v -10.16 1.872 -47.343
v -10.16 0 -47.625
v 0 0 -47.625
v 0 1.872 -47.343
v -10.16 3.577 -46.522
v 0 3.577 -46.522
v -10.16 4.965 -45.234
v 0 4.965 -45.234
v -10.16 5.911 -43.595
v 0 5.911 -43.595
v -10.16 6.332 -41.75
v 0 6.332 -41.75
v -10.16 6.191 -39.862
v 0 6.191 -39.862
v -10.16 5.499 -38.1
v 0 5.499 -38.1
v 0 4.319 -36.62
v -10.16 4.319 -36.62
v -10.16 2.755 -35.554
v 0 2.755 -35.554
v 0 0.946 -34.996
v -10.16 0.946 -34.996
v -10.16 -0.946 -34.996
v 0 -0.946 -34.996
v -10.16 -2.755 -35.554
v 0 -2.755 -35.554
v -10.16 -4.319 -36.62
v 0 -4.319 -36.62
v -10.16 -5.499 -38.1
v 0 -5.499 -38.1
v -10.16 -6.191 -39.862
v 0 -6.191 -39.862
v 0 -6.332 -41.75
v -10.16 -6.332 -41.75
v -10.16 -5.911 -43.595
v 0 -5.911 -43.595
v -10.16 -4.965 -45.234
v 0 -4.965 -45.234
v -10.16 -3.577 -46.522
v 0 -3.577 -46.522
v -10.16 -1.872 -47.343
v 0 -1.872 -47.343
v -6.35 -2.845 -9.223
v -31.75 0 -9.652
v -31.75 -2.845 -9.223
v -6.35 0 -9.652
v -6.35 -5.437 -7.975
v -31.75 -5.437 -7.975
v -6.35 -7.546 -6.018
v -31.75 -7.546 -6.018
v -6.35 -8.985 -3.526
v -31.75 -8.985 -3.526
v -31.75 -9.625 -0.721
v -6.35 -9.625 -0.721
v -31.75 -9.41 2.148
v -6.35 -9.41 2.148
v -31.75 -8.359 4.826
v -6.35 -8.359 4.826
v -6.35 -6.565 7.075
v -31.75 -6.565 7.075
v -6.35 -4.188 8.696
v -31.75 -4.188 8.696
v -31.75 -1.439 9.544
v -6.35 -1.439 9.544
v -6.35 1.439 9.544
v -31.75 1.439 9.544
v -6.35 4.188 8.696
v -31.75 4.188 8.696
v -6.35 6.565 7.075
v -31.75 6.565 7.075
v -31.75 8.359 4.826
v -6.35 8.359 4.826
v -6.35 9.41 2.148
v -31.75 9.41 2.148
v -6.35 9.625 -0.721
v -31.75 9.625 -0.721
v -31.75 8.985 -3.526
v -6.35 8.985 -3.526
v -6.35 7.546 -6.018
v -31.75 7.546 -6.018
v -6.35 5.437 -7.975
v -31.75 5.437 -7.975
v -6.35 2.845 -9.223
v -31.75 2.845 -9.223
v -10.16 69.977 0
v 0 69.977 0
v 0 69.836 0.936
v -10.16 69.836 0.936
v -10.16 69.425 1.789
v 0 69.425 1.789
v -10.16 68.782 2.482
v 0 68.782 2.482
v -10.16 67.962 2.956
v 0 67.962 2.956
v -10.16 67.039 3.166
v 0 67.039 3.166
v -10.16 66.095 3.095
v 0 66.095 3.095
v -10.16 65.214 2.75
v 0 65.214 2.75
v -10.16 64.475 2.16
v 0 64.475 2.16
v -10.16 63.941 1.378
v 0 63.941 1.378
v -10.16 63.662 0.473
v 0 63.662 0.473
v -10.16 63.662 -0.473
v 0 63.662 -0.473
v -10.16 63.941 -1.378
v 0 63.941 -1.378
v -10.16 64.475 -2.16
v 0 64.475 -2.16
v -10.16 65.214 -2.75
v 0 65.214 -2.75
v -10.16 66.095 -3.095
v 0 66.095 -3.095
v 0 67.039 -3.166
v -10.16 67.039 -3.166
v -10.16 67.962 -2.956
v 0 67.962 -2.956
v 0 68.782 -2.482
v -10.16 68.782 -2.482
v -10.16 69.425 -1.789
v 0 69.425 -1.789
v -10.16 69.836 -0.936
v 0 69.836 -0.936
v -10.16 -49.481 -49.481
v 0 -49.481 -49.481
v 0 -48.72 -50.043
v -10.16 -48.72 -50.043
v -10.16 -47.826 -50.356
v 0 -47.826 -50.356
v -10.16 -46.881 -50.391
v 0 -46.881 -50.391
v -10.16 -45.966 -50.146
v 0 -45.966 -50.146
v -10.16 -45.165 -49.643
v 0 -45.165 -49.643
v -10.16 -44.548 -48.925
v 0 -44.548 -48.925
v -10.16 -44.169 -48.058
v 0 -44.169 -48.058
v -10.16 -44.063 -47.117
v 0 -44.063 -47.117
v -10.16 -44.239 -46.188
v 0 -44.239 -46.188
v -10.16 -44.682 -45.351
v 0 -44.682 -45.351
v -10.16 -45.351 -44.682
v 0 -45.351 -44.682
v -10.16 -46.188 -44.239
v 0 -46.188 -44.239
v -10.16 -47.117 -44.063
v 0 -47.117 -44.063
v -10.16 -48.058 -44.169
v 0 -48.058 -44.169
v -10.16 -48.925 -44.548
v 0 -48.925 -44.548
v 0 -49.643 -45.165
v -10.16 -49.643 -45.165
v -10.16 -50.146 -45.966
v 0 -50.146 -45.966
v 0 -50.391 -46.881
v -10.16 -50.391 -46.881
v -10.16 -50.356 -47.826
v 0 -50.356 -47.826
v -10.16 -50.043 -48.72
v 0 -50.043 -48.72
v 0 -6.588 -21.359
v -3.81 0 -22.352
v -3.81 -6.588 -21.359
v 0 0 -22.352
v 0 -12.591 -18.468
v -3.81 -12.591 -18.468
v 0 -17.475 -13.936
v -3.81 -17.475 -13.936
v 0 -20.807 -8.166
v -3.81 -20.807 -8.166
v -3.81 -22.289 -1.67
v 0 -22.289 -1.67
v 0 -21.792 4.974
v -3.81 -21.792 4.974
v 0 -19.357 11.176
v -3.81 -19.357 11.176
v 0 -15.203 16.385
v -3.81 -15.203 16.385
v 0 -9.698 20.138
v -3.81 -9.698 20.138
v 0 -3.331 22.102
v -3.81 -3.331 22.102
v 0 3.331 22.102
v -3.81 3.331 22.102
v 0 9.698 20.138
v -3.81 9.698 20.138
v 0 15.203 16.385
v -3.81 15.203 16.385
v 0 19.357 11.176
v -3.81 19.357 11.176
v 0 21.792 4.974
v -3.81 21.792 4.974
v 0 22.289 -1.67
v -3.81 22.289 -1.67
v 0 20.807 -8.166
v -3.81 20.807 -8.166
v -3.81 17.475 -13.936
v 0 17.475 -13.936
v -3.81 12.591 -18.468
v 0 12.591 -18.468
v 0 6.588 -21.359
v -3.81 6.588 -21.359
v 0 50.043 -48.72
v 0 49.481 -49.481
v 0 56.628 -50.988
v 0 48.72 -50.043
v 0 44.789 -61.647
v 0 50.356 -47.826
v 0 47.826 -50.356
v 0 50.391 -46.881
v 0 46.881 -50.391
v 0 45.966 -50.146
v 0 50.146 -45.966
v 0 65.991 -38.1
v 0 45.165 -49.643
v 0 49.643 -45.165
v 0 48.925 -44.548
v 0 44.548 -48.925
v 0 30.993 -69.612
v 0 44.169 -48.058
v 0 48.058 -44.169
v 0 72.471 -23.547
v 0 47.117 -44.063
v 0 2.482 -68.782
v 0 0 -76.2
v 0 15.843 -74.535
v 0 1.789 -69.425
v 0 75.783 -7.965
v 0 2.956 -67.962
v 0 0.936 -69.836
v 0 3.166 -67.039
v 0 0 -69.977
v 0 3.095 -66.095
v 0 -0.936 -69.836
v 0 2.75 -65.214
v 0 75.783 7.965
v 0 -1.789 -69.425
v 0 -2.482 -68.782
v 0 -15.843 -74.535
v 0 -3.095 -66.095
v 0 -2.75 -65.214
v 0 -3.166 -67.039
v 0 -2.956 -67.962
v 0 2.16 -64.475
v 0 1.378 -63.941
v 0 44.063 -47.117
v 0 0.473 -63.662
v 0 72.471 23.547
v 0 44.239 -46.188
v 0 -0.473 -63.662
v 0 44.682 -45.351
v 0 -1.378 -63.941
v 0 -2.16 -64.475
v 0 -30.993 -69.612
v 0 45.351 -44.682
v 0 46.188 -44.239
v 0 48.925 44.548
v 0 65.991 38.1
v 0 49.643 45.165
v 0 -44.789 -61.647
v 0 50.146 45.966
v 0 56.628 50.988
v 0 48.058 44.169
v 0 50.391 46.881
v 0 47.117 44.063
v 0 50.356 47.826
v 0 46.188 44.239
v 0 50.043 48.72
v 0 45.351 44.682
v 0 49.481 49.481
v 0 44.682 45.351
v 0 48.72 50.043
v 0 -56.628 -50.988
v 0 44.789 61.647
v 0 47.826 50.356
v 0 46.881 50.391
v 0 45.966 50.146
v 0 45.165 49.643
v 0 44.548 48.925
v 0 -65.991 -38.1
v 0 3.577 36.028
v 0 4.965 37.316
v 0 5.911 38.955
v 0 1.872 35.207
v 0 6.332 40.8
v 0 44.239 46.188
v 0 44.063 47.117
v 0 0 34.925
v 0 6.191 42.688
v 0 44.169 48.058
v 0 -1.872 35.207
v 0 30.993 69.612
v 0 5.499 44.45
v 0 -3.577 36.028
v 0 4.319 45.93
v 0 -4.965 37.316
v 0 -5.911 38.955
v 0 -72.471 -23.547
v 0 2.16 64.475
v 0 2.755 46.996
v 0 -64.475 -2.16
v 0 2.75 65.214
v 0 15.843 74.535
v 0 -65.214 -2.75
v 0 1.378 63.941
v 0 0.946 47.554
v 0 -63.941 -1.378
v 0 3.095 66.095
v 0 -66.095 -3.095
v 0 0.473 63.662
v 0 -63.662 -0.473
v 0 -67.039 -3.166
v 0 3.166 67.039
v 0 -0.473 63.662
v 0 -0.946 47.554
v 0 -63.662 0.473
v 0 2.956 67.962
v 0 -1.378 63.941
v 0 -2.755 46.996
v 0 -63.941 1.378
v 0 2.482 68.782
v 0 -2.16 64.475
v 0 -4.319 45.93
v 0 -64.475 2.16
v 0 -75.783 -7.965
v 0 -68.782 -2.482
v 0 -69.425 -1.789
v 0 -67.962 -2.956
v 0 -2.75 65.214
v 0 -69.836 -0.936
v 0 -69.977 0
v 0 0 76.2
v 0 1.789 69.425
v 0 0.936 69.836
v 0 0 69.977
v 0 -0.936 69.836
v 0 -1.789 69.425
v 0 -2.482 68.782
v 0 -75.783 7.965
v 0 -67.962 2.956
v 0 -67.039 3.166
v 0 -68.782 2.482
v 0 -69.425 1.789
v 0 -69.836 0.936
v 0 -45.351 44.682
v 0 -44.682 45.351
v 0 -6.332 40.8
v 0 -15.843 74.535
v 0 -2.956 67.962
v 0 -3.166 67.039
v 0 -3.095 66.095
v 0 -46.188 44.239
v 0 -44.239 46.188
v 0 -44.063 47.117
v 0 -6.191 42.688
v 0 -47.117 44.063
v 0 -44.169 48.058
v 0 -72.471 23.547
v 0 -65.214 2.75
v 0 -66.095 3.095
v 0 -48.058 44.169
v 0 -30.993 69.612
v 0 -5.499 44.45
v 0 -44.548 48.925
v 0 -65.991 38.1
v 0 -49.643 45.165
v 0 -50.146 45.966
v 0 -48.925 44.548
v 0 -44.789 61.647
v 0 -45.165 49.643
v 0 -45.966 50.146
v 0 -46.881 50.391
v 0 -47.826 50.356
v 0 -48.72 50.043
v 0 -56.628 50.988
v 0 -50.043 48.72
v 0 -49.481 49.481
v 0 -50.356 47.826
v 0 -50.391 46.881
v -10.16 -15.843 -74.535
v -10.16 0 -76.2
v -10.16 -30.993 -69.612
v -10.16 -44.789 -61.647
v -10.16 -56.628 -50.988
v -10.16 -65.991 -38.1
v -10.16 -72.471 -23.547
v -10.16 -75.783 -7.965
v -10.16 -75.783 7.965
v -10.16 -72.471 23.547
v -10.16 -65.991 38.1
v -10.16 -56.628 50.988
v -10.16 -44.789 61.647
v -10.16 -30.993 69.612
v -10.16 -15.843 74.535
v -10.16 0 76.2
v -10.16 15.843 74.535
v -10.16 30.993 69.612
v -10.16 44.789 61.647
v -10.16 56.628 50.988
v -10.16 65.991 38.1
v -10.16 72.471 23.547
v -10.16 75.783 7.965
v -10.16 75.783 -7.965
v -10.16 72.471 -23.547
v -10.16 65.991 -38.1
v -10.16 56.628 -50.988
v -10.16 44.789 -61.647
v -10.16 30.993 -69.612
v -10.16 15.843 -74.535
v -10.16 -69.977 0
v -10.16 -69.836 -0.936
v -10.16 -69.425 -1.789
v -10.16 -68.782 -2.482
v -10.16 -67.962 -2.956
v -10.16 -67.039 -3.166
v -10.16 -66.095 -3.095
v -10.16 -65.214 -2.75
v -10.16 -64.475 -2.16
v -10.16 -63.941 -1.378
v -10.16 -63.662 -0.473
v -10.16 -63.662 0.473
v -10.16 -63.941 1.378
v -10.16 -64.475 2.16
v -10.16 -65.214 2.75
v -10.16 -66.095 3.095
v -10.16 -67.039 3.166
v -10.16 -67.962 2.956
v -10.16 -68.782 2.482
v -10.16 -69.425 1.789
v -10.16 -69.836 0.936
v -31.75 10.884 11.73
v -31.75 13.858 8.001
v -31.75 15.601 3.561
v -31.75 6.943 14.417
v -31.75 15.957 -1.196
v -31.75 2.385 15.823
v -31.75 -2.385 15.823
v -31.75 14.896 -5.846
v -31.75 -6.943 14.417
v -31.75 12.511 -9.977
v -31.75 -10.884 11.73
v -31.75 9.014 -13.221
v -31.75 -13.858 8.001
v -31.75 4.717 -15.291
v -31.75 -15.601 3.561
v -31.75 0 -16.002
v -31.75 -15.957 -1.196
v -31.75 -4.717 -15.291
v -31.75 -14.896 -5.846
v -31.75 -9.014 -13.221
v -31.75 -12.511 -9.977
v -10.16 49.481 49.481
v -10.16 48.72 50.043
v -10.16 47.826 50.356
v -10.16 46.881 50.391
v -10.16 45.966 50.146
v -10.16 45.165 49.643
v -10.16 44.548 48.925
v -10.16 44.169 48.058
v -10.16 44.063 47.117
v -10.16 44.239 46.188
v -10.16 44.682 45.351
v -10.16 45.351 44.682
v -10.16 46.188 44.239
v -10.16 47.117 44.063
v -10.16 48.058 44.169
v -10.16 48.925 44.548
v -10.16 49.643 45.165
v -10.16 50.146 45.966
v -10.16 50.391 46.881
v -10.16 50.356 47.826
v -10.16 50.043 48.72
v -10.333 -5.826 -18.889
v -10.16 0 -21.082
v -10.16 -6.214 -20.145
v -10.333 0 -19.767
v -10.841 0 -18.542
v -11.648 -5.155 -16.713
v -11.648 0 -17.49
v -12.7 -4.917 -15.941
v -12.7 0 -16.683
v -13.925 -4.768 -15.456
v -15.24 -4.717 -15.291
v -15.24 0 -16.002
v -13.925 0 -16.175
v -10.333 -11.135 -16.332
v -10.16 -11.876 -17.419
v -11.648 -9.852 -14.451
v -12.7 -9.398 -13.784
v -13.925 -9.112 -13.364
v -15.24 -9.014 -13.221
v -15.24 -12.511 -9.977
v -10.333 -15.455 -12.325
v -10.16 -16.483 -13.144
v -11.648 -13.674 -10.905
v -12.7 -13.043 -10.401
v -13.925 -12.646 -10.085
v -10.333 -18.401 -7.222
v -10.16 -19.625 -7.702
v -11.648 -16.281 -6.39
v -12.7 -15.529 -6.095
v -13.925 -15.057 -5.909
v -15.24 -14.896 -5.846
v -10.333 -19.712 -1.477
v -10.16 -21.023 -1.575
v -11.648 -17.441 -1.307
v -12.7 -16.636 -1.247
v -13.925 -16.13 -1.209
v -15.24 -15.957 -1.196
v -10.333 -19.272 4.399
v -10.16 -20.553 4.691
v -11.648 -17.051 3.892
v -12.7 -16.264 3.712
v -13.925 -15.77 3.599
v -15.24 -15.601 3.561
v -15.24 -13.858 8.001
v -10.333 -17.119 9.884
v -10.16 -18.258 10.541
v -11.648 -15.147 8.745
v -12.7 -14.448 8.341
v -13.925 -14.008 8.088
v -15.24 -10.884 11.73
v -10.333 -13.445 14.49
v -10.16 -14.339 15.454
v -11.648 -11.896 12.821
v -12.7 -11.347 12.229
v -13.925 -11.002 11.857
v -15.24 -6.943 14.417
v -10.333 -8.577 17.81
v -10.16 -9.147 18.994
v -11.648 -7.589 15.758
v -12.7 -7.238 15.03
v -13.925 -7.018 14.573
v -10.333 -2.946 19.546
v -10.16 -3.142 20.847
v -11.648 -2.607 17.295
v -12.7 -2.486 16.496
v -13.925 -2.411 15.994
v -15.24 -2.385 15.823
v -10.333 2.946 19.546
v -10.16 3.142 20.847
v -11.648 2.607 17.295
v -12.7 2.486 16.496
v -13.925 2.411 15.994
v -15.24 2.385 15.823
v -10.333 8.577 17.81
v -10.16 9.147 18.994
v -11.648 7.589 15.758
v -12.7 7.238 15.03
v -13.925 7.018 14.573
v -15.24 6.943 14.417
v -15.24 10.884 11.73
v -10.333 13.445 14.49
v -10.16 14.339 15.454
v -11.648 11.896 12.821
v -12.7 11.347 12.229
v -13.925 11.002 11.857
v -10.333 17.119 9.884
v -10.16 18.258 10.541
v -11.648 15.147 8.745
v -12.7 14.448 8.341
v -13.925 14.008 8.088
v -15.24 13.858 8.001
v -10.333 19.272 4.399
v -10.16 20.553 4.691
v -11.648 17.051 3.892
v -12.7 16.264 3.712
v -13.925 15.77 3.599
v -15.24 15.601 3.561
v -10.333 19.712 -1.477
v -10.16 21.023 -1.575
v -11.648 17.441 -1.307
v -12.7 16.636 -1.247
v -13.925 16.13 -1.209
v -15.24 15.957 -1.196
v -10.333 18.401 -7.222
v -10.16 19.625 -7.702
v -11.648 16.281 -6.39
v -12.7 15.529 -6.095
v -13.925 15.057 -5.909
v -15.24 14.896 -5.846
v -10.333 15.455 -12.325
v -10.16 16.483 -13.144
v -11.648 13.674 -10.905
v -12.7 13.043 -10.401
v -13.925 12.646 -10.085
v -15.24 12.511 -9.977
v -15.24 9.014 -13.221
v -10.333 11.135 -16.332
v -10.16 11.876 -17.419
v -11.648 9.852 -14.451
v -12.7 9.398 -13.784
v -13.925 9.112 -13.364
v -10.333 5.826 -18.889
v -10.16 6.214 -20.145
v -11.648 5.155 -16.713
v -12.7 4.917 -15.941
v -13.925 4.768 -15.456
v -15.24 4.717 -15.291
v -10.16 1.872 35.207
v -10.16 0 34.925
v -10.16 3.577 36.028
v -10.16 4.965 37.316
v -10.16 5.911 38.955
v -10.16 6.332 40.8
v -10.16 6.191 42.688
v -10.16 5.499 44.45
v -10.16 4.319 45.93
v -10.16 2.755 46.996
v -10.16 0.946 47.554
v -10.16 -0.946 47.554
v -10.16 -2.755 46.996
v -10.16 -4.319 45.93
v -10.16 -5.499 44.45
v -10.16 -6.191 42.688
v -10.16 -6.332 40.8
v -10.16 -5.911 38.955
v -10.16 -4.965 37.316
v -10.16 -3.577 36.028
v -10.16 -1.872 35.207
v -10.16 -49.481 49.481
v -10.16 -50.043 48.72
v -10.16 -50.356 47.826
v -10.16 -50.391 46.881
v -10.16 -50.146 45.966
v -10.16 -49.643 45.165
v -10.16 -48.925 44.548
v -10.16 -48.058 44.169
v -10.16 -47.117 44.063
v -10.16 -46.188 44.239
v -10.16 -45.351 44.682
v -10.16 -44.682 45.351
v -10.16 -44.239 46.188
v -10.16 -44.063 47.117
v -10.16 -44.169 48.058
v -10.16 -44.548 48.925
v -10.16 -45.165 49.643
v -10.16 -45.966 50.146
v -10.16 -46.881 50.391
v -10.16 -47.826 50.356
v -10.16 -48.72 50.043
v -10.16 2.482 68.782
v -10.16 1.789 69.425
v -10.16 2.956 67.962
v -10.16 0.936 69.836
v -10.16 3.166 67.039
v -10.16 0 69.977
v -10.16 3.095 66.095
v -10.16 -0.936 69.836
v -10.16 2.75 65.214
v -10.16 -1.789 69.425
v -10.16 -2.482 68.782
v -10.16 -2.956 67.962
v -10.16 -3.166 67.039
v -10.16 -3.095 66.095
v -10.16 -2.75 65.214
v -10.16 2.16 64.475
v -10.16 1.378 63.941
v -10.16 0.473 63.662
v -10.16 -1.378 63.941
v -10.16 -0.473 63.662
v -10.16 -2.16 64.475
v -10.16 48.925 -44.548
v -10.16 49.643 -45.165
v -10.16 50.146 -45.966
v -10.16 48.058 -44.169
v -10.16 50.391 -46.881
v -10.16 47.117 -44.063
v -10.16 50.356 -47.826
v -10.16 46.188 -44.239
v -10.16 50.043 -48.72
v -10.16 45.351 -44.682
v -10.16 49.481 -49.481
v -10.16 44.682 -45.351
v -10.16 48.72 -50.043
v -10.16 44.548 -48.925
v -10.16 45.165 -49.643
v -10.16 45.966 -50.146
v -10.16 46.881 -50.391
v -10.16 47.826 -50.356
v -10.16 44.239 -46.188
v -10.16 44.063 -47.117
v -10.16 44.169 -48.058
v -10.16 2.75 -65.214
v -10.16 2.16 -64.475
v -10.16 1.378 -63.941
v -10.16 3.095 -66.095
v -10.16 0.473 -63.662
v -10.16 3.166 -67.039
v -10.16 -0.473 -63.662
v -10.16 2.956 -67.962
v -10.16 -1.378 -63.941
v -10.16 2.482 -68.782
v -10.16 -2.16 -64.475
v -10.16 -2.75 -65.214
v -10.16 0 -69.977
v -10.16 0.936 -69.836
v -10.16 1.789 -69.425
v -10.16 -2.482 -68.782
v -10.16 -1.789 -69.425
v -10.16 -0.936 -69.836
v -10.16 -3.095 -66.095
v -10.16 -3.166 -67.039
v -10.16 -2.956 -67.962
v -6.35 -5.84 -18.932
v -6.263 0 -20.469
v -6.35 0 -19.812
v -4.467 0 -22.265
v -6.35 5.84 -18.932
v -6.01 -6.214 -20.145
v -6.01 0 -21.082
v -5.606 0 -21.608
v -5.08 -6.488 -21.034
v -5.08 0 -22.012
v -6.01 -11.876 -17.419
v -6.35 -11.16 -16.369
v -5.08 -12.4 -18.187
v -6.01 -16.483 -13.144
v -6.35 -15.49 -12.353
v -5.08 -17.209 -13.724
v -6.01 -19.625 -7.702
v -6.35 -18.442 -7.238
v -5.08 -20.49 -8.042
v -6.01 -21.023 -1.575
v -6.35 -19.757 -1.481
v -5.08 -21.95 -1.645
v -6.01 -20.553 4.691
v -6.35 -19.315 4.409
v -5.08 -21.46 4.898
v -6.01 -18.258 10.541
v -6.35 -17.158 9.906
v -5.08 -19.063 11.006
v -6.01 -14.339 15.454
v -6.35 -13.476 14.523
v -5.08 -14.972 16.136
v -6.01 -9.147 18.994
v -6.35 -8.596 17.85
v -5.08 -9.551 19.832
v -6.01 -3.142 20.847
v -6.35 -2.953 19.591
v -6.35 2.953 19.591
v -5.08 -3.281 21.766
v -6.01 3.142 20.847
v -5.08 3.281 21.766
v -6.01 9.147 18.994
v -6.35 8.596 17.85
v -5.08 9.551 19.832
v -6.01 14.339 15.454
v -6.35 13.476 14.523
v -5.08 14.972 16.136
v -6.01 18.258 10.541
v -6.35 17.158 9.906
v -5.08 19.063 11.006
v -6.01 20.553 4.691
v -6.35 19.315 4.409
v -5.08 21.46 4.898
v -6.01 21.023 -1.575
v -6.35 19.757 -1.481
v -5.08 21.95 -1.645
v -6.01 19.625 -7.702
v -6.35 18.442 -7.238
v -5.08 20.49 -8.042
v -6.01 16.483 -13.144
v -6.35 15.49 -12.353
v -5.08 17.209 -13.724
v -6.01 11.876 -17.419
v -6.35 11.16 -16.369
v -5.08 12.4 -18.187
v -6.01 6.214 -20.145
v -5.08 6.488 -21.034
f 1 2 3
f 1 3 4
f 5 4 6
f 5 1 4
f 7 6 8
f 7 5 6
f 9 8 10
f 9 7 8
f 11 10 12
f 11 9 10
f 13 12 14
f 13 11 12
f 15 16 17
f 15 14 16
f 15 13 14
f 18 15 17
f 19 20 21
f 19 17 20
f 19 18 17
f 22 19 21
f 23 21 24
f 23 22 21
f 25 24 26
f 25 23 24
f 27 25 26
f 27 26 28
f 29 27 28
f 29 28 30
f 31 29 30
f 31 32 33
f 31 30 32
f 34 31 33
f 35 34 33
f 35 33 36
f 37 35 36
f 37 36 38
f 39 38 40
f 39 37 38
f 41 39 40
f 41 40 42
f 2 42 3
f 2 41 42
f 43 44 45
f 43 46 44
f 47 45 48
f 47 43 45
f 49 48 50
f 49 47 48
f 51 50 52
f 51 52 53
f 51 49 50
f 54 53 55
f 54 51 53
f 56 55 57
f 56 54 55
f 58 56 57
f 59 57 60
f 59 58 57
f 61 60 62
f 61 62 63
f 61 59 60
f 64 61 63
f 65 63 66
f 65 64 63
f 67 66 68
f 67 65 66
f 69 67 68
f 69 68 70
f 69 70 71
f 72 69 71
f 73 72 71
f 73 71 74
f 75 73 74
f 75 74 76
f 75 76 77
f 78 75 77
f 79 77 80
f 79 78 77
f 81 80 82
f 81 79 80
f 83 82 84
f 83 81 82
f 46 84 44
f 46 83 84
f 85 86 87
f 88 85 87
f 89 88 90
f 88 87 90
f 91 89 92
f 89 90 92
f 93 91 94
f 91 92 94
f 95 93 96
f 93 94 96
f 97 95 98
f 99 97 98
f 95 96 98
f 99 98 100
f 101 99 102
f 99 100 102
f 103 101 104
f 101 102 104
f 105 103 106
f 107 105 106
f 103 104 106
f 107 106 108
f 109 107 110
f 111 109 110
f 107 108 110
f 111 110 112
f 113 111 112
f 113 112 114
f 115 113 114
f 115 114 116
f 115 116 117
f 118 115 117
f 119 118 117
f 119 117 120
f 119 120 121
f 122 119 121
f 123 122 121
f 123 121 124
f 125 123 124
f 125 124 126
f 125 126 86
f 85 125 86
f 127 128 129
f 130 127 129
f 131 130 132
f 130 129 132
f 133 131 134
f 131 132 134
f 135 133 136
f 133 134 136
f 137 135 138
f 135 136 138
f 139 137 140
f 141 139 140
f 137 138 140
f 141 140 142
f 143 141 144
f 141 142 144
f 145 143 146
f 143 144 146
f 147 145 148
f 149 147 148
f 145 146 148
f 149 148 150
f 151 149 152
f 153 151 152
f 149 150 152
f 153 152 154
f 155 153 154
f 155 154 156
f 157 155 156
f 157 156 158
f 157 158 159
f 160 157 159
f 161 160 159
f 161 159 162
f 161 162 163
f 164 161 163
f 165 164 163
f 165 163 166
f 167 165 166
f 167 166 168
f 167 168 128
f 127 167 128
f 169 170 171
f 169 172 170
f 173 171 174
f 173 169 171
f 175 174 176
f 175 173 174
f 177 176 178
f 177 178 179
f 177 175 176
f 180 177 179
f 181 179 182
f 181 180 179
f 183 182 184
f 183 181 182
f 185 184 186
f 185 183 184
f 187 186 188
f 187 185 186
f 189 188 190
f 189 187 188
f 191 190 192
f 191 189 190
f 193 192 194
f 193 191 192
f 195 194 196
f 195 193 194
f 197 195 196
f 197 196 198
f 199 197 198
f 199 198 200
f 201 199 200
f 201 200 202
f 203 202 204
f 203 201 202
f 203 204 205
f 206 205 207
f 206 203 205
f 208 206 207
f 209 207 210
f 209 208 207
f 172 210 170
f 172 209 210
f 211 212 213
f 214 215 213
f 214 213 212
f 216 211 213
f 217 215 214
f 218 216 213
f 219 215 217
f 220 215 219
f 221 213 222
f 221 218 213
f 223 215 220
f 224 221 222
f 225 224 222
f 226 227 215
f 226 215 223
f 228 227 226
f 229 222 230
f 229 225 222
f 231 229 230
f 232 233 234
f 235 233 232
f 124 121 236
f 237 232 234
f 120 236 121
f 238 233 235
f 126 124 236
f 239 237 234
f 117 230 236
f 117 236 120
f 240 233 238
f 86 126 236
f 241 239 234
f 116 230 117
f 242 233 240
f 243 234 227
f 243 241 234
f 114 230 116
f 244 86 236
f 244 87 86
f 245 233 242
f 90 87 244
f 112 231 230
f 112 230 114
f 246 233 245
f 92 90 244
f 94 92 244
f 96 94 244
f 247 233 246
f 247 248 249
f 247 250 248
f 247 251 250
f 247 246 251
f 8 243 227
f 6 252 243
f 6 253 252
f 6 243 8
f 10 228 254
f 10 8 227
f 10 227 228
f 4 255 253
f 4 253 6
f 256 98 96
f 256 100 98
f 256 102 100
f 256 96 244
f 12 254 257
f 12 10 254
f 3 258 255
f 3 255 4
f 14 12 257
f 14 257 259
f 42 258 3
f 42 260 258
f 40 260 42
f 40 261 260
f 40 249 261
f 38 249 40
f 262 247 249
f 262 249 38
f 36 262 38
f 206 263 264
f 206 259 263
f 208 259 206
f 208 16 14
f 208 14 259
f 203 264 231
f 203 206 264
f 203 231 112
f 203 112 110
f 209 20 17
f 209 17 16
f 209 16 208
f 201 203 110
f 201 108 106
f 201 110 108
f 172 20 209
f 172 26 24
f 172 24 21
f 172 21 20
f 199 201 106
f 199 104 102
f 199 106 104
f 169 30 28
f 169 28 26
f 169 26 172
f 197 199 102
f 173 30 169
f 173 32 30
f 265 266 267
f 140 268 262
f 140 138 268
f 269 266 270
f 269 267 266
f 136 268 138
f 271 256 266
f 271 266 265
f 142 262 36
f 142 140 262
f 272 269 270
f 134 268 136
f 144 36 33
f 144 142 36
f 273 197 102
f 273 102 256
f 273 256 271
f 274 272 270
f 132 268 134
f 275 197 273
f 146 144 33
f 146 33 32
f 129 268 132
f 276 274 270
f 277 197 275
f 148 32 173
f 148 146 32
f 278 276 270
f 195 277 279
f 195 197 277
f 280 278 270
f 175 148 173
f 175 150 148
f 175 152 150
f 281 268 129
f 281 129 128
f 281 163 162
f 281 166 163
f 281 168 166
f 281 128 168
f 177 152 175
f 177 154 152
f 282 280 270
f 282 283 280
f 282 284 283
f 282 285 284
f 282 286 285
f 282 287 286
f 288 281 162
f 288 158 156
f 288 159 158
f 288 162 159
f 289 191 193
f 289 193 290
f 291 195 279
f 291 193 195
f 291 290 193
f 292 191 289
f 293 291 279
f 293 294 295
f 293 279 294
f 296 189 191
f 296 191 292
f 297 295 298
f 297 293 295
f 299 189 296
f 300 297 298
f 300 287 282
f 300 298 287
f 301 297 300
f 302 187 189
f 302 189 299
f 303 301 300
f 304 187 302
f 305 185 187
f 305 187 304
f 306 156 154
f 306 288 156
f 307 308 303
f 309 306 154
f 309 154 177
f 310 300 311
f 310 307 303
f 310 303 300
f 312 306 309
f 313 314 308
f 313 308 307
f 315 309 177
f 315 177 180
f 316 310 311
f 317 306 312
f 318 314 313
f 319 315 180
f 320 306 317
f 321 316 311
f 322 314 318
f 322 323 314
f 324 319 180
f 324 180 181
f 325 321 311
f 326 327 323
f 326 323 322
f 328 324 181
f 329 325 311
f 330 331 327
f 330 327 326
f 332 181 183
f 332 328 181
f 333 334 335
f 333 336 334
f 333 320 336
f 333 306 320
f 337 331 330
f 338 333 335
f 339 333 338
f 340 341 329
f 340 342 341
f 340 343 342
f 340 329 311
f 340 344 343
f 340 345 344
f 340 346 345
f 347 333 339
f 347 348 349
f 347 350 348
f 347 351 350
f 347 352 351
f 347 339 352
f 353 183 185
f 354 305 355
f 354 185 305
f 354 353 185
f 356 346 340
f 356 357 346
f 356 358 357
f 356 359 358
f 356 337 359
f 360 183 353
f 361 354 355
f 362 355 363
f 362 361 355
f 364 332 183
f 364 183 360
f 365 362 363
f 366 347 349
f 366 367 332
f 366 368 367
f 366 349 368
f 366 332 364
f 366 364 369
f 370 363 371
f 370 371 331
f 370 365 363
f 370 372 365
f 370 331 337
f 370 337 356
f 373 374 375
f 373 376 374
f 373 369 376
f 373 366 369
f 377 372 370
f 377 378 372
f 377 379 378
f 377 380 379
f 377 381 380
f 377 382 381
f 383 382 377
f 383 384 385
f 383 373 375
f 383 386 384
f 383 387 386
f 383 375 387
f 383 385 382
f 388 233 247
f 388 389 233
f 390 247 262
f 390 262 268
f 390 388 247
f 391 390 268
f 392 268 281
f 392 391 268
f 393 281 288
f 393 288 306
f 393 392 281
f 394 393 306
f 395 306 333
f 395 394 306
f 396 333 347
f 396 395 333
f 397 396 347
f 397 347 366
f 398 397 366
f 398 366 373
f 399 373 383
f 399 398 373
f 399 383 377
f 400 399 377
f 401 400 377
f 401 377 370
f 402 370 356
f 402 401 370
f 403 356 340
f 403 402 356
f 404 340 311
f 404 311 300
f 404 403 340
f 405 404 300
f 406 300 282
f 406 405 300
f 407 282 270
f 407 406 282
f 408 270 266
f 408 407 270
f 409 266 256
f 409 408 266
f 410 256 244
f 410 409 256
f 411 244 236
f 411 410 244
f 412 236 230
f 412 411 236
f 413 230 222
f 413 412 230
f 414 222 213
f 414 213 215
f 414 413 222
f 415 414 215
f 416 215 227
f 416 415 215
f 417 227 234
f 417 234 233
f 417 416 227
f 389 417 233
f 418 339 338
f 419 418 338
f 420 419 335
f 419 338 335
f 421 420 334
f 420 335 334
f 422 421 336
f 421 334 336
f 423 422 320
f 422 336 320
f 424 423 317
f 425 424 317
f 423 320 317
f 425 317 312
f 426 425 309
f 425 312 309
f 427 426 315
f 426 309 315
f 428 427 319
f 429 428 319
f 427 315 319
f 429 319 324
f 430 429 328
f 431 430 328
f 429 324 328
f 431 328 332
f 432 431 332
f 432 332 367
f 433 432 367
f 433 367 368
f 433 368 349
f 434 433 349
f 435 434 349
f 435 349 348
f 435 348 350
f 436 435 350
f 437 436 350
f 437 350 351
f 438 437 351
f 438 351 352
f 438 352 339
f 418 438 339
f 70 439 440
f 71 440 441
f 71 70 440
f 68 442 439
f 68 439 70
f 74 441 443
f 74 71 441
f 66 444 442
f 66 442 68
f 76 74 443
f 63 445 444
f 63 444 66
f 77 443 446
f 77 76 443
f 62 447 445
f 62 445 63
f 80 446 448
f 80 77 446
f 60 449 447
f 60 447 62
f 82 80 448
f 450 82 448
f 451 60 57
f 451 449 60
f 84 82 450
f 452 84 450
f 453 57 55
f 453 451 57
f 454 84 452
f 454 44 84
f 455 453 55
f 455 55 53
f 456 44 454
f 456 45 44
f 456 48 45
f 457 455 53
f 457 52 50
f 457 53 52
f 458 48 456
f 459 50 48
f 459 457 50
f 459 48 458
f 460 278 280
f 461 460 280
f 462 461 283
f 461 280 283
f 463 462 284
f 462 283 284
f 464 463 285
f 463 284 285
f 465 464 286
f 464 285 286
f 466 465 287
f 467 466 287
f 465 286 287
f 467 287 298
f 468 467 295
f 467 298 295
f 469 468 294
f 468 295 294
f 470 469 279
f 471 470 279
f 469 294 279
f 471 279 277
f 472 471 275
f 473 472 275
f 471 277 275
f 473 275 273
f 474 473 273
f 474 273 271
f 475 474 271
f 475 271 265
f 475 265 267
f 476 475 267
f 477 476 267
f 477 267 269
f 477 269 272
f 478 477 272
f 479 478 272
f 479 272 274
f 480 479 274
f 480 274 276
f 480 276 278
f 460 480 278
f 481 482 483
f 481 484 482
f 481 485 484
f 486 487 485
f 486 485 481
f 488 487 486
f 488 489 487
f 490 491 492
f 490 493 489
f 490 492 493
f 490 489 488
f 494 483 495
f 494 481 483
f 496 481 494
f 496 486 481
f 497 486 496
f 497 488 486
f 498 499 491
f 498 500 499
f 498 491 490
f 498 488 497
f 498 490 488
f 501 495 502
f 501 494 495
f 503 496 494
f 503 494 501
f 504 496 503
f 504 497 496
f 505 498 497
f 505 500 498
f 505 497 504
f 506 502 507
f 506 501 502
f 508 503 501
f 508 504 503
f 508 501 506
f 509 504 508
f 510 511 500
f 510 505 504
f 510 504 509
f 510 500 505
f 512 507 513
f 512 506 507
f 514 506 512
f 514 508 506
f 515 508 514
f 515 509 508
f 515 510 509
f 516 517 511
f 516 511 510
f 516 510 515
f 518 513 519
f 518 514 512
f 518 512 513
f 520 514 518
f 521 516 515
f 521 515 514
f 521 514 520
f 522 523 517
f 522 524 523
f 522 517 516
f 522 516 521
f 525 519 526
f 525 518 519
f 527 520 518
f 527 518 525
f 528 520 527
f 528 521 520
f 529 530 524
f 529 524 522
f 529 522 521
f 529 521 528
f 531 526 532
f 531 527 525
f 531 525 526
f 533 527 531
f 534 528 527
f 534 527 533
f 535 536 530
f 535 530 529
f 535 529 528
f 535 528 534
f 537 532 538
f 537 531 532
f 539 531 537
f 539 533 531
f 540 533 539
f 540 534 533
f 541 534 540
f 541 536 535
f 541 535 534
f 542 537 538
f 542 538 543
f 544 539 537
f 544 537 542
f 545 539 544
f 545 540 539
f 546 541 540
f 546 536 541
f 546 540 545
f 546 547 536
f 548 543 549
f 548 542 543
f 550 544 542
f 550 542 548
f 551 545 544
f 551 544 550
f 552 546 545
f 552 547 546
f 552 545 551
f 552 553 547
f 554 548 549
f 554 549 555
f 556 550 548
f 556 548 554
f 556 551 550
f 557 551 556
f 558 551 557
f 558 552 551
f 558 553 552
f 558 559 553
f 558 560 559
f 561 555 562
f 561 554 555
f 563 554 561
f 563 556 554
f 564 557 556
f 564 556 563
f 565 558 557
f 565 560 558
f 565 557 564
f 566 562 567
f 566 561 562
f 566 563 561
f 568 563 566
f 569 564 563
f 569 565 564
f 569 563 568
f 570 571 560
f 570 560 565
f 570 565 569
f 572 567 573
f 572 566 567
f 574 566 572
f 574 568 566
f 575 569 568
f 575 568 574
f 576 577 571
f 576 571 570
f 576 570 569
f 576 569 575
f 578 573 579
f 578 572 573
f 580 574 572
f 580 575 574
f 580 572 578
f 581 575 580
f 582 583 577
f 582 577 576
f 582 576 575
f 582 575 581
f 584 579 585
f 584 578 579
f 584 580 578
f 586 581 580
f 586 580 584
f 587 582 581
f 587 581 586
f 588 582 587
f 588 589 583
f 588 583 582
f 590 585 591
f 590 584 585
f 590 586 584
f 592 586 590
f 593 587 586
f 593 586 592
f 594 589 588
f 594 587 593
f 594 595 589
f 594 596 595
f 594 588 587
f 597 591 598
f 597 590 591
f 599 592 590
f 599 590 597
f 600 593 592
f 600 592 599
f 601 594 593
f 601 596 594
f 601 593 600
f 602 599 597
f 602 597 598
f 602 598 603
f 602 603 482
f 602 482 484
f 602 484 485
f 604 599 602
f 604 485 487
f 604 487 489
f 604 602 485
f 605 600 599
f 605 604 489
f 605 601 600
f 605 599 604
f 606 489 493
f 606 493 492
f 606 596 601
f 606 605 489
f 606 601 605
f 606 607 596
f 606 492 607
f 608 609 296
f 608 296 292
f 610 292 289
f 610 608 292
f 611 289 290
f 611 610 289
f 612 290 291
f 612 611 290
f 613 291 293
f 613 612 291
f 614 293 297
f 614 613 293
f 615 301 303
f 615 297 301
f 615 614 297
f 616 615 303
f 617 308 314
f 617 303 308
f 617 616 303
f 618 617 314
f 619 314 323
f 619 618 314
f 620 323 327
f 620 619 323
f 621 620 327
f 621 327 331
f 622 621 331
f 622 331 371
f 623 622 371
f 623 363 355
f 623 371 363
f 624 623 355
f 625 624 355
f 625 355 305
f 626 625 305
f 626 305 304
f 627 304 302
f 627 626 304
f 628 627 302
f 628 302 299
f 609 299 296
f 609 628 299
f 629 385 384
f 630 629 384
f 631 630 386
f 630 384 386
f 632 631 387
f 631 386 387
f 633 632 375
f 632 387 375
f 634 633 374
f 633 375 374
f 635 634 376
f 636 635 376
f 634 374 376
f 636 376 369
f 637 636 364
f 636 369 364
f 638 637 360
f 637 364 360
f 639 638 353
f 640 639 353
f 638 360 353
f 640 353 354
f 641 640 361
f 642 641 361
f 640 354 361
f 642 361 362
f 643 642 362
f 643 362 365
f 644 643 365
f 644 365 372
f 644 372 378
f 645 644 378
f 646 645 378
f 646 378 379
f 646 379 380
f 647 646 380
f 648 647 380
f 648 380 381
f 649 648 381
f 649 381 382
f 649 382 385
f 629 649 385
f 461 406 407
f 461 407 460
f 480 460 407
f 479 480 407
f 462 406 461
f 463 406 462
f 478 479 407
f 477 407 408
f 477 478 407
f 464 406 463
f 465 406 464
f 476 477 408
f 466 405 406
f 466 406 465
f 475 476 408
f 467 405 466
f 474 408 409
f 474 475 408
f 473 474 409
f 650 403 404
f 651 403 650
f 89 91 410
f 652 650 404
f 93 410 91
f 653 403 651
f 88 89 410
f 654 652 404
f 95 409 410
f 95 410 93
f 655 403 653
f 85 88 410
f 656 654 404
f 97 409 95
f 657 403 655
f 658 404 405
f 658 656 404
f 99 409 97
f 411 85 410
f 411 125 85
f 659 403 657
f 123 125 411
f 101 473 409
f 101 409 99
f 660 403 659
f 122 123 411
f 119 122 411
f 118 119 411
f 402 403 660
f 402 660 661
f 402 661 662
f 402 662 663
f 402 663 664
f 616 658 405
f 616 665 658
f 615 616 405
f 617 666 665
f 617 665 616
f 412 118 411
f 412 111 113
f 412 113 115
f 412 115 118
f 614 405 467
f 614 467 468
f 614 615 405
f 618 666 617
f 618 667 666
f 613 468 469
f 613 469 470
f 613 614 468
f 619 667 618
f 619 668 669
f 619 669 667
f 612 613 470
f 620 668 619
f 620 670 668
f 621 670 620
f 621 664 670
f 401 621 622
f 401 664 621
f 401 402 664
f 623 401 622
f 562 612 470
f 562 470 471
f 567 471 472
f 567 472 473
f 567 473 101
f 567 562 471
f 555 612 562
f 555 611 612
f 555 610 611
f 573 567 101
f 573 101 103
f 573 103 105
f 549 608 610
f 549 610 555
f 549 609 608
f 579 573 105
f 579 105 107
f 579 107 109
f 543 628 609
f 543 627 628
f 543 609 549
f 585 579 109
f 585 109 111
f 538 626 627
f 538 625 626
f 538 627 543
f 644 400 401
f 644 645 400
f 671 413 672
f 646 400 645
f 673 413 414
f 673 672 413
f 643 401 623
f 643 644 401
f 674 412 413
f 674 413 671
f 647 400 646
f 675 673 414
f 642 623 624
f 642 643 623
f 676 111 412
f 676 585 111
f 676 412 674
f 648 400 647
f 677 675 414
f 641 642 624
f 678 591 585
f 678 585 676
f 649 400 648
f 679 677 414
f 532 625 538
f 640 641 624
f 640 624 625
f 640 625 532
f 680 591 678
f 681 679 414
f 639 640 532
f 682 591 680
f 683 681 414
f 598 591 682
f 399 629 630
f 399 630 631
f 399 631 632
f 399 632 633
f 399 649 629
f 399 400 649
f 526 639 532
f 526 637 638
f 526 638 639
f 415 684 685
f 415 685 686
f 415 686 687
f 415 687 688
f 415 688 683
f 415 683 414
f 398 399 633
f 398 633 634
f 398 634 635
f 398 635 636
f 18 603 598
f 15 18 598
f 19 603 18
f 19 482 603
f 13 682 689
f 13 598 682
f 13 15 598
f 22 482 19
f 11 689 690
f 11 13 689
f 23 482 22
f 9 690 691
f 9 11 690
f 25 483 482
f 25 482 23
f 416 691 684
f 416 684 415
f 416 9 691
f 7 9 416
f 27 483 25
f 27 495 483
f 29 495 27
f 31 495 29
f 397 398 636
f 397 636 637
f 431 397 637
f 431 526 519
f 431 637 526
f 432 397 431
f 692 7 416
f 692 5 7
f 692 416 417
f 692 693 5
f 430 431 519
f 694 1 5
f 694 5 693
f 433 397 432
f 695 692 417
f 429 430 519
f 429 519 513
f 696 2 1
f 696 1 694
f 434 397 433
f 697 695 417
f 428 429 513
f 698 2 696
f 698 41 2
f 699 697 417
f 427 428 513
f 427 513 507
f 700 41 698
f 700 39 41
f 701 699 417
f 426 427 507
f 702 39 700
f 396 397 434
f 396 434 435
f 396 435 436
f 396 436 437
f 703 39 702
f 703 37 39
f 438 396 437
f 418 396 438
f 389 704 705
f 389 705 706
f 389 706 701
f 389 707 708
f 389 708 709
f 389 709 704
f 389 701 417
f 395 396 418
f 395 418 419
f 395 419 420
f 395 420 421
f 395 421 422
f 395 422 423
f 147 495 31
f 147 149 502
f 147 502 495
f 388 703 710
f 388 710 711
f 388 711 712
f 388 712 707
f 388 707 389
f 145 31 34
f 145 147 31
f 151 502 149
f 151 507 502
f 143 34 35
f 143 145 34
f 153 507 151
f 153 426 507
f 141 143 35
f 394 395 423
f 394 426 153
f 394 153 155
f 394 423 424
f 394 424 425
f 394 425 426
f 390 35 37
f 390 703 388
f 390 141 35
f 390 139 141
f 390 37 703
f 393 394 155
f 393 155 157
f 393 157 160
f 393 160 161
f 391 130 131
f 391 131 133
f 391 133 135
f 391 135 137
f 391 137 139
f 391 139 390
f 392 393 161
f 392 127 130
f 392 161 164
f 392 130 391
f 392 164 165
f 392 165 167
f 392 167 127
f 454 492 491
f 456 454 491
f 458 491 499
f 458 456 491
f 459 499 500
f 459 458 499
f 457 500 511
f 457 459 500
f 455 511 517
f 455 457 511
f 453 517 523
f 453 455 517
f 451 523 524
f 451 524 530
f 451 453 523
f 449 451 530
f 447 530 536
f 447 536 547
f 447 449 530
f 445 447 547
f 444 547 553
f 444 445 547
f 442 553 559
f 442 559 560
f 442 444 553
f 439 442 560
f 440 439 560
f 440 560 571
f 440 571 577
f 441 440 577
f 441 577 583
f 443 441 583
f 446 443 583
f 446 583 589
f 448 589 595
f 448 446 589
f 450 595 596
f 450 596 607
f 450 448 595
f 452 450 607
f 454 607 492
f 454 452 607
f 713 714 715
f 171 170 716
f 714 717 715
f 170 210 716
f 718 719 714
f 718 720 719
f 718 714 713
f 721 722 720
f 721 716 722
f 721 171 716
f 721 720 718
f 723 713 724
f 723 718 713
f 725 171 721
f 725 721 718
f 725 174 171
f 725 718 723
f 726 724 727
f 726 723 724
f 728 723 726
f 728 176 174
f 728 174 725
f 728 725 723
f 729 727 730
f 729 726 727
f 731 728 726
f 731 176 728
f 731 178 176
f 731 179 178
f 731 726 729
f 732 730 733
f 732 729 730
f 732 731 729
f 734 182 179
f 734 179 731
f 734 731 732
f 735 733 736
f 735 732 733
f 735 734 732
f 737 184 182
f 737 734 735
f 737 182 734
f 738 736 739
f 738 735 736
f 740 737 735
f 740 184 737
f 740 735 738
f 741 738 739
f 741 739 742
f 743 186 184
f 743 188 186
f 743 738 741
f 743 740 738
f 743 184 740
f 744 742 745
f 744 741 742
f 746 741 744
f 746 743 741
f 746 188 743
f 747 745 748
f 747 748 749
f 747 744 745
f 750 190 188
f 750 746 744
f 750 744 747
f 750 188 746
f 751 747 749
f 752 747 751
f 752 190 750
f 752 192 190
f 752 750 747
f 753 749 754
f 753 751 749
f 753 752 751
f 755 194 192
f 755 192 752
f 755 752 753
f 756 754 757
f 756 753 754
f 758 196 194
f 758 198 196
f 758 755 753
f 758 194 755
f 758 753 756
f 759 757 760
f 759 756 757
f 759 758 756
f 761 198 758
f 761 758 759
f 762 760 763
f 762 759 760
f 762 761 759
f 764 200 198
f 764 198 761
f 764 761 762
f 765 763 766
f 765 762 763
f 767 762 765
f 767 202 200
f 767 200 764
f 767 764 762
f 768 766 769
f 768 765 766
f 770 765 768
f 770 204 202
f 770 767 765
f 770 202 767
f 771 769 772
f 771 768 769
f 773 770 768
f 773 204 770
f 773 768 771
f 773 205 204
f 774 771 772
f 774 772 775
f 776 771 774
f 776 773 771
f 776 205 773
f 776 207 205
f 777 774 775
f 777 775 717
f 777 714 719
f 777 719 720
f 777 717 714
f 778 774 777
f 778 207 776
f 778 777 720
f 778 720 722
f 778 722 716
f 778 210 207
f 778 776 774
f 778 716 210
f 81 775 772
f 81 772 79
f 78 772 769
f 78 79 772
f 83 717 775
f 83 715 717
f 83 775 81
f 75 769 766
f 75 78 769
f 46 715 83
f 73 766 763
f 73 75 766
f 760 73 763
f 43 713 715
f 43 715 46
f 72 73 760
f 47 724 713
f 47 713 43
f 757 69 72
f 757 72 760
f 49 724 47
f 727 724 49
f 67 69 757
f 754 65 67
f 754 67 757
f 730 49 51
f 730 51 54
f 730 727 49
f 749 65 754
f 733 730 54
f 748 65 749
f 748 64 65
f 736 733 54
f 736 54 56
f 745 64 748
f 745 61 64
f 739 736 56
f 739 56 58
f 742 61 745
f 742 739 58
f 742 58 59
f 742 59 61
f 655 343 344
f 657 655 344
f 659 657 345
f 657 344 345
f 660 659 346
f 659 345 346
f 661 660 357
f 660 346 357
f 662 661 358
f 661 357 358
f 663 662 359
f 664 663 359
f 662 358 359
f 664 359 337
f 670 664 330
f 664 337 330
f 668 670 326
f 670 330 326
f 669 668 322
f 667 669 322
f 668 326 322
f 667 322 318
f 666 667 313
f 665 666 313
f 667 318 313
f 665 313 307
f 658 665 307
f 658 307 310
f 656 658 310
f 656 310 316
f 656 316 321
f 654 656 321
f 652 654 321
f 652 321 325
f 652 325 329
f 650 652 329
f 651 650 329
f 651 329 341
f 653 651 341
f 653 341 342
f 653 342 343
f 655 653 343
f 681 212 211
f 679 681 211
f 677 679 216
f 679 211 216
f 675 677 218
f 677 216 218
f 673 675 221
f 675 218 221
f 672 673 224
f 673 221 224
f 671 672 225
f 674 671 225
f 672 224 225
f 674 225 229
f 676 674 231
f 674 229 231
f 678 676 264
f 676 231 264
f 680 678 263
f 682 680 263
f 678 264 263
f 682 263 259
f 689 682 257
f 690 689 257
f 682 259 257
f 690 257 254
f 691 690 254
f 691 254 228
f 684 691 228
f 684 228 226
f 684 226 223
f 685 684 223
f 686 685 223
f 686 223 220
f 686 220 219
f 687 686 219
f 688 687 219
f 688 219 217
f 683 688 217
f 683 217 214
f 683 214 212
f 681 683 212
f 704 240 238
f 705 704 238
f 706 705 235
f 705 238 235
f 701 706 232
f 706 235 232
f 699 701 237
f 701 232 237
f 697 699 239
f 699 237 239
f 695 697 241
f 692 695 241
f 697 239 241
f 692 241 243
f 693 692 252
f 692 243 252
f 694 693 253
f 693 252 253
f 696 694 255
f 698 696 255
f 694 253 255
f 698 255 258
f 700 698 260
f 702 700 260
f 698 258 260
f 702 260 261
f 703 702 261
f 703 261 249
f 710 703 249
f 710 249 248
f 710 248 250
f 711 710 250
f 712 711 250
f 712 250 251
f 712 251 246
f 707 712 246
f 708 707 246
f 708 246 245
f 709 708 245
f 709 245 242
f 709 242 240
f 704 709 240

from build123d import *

# Parameters (mm, degrees)
CUT_EXTRUDE1_DEPTH      = 113.342968182
CUT_EXTRUDE1_DEPTH_BACK = 113.342968182
SKETCH2_R               = 6.35
SKETCH3_R               = 3.175
CUT_EXTRUDE2_DEPTH      = 113.342968182
CIRPATTERN1_COUNT       = 8


with BuildPart() as part:
    # Sketch1 → Revolve1 (revolve)
    with BuildSketch(Plane.XY, mode=Mode.PRIVATE) as revolve1_sk:
        with BuildLine():
            Line((0, 76.2), (-10.16, 76.2))
            Line((-10.16, 76.2), (-10.16, 21.082))
            ThreePointArc((-10.16, 21.082), (-11.647897552, 17.489897552), (-15.24, 16.002))
            Line((-15.24, 16.002), (-31.75, 16.002))
            Line((-31.75, 16.002), (-31.75, 9.652))
            Line((-31.75, 9.652), (-6.35, 9.652))
            Line((-6.35, 9.652), (-6.35, 19.812))
            ThreePointArc((-6.35, 19.812), (-5.606051224, 21.608051224), (-3.81, 22.352))
            Line((-3.81, 22.352), (0, 22.352))
            Line((0, 22.352), (0, 76.2))
        make_face()
    revolve(revolve1_sk.sketch.rotate(Axis((0, 0, 0), (-1, 0, 0)), 90), axis=Axis((0, 0, 0), (-1, 0, 0)))

    # Sketch2 → Cut-Extrude1 (cut, two sides: drawn at the far end of the back side and taken through both)
    with BuildSketch(Plane(origin=(0, 0, 0), x_dir=(0, 0, -1), z_dir=(1, 0, 0)).offset(-CUT_EXTRUDE1_DEPTH_BACK)):
        with Locations((41.275, 0)):
            Circle(SKETCH2_R)
        with Locations((-41.275, 0)):
            Circle(SKETCH2_R)
    extrude(amount=CUT_EXTRUDE1_DEPTH + CUT_EXTRUDE1_DEPTH_BACK, mode=Mode.SUBTRACT)

    # Sketch3 → Cut-Extrude2 (cut, through all)
    with BuildSketch(Plane(origin=(0, 0, 0), x_dir=(0, 0, -1), z_dir=(1, 0, 0))):
        with Locations((66.802, 0)):
            Circle(SKETCH3_R)
    cut_extrude2 = extrude(amount=-CUT_EXTRUDE2_DEPTH, mode=Mode.SUBTRACT)

    # CirPattern1: Cut-Extrude2 ×8 about axis
    cirpattern1_axis = Axis((0, 0, 0), (1, 0, 0))
    for i in range(1, CIRPATTERN1_COUNT):
        add(cut_extrude2.rotate(cirpattern1_axis, i * 360 / CIRPATTERN1_COUNT), mode=Mode.SUBTRACT)


solid = part.part
